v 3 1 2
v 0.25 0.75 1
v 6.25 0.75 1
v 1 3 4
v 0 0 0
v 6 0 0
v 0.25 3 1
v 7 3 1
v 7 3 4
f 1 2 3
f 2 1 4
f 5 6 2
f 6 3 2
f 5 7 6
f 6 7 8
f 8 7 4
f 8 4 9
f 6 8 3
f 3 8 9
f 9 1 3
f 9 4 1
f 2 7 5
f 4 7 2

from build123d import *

# Parameters (mm, degrees)
F0_W      = 7
F0_H      = 3
F1_DEPTH  = 4
F5_W      = 7
F5_H      = 5
F6_DEPTH  = 25
F9_DEPTH  = 25
F12_DEPTH = 25
F15_W     = 10.8853101265
F15_H     = 4.9926914508
F16_DEPTH = 25
F2_W      = 0.4919341039
F2_H      = 0.3611877114
F18_DEPTH = 1
F25_DEPTH = 25


with BuildPart() as f1:
    # F0 (on Top) → F1 (new body)
    with BuildSketch(Plane.XY):
        with Locations((3.5, 1.5)):
            Rectangle(F0_W, F0_H)
    extrude(amount=F1_DEPTH)

    # F5 (on 3pt) → F6 (cut)
    with BuildSketch(Plane(origin=(0, 0, 0), x_dir=(-1, 0, 0), z_dir=(0, 0.8, -0.6))):
        with Locations((-3.5, 2.5)):
            Rectangle(F5_W, F5_H)
    extrude(amount=-F6_DEPTH, mode=Mode.SUBTRACT)

    # F8 (on 3pt) → F9 (cut)
    with BuildSketch(Plane(origin=(5.4, -1.8, 0), x_dir=(-0.316227766, -0.9486832981, 0), z_dir=(-0.9486832981, 0.316227766, 0))):
        Polygon((-1.8973665961, 0), (-5.0596442563, 4), (-5.0596442563, 1), (-5.0596442563, 0), align=None)
    extrude(amount=-F9_DEPTH, mode=Mode.SUBTRACT)

    # F11 (on 3pt) → F12 (cut)
    with BuildSketch(Plane(origin=(0, 0, 0), x_dir=(0, -1, 0), z_dir=(-0.9701425001, 0, 0.242535625))):
        Polygon((0, 0), (-3, 4.1231056256), (-3, 0), align=None)
    extrude(amount=F12_DEPTH, mode=Mode.SUBTRACT)

    # F15 (on 3pt) → F16 (cut)
    with BuildSketch(Plane(origin=(0, 0, 0), x_dir=(1, 0, 0), z_dir=(0, -0.316227766, 0.9486832981))):
        with Locations((3.1432170654, 1.333998458)):
            Rectangle(F15_W, F15_H)
    extrude(amount=-F16_DEPTH, mode=Mode.SUBTRACT)

    # F20 (on 3pt) → F21 section 0
    with BuildSketch(Plane(origin=(0, 0.4705882353, -0.1176470588), x_dir=(1, 0, 0), z_dir=(0, -0.9701425001, 0.242535625)), mode=Mode.PRIVATE) as f21_s0:
        Polygon((3, 2.1828206253), (0.25, 1.1520442189), (6.25, 1.1520442189), align=None)
    loft([f21_s0.sketch, Vertex(1, 3, 4)])

    # F23 (on 3pt) → F24 section 0
    with BuildSketch(Plane(origin=(0.08, -0.56, 0.4), x_dir=(-0.9933109617, -0.0939618477, 0.0671156055), z_dir=(-0.1154700538, 0.8082903769, -0.5773502692)), mode=Mode.PRIVATE) as f24_s0:
        Polygon((-6.211549291, 1.2496621165), (-2.9396635218, 2.2087051361), (-6.9665998531, 4.998648466), align=None)
    loft([f24_s0.sketch, Vertex(1, 3, 4)])


with BuildPart() as f18:
    # F2 (on face) → F18 (new body)
    with BuildSketch(Plane.XZ):
        with Locations((2.7540329481, 2.1805938557)):
            Rectangle(F2_W, F2_H)
    extrude(amount=F18_DEPTH)

    # F25 (cut): a face of the model
    f25_faces = [f18.faces().sort_by_distance(p)[0] for p in [
        (2.7540329481, 0, 2.1805938557),
    ]]
    extrude(f25_faces, amount=-F25_DEPTH, mode=Mode.SUBTRACT)


solid = f1.part
